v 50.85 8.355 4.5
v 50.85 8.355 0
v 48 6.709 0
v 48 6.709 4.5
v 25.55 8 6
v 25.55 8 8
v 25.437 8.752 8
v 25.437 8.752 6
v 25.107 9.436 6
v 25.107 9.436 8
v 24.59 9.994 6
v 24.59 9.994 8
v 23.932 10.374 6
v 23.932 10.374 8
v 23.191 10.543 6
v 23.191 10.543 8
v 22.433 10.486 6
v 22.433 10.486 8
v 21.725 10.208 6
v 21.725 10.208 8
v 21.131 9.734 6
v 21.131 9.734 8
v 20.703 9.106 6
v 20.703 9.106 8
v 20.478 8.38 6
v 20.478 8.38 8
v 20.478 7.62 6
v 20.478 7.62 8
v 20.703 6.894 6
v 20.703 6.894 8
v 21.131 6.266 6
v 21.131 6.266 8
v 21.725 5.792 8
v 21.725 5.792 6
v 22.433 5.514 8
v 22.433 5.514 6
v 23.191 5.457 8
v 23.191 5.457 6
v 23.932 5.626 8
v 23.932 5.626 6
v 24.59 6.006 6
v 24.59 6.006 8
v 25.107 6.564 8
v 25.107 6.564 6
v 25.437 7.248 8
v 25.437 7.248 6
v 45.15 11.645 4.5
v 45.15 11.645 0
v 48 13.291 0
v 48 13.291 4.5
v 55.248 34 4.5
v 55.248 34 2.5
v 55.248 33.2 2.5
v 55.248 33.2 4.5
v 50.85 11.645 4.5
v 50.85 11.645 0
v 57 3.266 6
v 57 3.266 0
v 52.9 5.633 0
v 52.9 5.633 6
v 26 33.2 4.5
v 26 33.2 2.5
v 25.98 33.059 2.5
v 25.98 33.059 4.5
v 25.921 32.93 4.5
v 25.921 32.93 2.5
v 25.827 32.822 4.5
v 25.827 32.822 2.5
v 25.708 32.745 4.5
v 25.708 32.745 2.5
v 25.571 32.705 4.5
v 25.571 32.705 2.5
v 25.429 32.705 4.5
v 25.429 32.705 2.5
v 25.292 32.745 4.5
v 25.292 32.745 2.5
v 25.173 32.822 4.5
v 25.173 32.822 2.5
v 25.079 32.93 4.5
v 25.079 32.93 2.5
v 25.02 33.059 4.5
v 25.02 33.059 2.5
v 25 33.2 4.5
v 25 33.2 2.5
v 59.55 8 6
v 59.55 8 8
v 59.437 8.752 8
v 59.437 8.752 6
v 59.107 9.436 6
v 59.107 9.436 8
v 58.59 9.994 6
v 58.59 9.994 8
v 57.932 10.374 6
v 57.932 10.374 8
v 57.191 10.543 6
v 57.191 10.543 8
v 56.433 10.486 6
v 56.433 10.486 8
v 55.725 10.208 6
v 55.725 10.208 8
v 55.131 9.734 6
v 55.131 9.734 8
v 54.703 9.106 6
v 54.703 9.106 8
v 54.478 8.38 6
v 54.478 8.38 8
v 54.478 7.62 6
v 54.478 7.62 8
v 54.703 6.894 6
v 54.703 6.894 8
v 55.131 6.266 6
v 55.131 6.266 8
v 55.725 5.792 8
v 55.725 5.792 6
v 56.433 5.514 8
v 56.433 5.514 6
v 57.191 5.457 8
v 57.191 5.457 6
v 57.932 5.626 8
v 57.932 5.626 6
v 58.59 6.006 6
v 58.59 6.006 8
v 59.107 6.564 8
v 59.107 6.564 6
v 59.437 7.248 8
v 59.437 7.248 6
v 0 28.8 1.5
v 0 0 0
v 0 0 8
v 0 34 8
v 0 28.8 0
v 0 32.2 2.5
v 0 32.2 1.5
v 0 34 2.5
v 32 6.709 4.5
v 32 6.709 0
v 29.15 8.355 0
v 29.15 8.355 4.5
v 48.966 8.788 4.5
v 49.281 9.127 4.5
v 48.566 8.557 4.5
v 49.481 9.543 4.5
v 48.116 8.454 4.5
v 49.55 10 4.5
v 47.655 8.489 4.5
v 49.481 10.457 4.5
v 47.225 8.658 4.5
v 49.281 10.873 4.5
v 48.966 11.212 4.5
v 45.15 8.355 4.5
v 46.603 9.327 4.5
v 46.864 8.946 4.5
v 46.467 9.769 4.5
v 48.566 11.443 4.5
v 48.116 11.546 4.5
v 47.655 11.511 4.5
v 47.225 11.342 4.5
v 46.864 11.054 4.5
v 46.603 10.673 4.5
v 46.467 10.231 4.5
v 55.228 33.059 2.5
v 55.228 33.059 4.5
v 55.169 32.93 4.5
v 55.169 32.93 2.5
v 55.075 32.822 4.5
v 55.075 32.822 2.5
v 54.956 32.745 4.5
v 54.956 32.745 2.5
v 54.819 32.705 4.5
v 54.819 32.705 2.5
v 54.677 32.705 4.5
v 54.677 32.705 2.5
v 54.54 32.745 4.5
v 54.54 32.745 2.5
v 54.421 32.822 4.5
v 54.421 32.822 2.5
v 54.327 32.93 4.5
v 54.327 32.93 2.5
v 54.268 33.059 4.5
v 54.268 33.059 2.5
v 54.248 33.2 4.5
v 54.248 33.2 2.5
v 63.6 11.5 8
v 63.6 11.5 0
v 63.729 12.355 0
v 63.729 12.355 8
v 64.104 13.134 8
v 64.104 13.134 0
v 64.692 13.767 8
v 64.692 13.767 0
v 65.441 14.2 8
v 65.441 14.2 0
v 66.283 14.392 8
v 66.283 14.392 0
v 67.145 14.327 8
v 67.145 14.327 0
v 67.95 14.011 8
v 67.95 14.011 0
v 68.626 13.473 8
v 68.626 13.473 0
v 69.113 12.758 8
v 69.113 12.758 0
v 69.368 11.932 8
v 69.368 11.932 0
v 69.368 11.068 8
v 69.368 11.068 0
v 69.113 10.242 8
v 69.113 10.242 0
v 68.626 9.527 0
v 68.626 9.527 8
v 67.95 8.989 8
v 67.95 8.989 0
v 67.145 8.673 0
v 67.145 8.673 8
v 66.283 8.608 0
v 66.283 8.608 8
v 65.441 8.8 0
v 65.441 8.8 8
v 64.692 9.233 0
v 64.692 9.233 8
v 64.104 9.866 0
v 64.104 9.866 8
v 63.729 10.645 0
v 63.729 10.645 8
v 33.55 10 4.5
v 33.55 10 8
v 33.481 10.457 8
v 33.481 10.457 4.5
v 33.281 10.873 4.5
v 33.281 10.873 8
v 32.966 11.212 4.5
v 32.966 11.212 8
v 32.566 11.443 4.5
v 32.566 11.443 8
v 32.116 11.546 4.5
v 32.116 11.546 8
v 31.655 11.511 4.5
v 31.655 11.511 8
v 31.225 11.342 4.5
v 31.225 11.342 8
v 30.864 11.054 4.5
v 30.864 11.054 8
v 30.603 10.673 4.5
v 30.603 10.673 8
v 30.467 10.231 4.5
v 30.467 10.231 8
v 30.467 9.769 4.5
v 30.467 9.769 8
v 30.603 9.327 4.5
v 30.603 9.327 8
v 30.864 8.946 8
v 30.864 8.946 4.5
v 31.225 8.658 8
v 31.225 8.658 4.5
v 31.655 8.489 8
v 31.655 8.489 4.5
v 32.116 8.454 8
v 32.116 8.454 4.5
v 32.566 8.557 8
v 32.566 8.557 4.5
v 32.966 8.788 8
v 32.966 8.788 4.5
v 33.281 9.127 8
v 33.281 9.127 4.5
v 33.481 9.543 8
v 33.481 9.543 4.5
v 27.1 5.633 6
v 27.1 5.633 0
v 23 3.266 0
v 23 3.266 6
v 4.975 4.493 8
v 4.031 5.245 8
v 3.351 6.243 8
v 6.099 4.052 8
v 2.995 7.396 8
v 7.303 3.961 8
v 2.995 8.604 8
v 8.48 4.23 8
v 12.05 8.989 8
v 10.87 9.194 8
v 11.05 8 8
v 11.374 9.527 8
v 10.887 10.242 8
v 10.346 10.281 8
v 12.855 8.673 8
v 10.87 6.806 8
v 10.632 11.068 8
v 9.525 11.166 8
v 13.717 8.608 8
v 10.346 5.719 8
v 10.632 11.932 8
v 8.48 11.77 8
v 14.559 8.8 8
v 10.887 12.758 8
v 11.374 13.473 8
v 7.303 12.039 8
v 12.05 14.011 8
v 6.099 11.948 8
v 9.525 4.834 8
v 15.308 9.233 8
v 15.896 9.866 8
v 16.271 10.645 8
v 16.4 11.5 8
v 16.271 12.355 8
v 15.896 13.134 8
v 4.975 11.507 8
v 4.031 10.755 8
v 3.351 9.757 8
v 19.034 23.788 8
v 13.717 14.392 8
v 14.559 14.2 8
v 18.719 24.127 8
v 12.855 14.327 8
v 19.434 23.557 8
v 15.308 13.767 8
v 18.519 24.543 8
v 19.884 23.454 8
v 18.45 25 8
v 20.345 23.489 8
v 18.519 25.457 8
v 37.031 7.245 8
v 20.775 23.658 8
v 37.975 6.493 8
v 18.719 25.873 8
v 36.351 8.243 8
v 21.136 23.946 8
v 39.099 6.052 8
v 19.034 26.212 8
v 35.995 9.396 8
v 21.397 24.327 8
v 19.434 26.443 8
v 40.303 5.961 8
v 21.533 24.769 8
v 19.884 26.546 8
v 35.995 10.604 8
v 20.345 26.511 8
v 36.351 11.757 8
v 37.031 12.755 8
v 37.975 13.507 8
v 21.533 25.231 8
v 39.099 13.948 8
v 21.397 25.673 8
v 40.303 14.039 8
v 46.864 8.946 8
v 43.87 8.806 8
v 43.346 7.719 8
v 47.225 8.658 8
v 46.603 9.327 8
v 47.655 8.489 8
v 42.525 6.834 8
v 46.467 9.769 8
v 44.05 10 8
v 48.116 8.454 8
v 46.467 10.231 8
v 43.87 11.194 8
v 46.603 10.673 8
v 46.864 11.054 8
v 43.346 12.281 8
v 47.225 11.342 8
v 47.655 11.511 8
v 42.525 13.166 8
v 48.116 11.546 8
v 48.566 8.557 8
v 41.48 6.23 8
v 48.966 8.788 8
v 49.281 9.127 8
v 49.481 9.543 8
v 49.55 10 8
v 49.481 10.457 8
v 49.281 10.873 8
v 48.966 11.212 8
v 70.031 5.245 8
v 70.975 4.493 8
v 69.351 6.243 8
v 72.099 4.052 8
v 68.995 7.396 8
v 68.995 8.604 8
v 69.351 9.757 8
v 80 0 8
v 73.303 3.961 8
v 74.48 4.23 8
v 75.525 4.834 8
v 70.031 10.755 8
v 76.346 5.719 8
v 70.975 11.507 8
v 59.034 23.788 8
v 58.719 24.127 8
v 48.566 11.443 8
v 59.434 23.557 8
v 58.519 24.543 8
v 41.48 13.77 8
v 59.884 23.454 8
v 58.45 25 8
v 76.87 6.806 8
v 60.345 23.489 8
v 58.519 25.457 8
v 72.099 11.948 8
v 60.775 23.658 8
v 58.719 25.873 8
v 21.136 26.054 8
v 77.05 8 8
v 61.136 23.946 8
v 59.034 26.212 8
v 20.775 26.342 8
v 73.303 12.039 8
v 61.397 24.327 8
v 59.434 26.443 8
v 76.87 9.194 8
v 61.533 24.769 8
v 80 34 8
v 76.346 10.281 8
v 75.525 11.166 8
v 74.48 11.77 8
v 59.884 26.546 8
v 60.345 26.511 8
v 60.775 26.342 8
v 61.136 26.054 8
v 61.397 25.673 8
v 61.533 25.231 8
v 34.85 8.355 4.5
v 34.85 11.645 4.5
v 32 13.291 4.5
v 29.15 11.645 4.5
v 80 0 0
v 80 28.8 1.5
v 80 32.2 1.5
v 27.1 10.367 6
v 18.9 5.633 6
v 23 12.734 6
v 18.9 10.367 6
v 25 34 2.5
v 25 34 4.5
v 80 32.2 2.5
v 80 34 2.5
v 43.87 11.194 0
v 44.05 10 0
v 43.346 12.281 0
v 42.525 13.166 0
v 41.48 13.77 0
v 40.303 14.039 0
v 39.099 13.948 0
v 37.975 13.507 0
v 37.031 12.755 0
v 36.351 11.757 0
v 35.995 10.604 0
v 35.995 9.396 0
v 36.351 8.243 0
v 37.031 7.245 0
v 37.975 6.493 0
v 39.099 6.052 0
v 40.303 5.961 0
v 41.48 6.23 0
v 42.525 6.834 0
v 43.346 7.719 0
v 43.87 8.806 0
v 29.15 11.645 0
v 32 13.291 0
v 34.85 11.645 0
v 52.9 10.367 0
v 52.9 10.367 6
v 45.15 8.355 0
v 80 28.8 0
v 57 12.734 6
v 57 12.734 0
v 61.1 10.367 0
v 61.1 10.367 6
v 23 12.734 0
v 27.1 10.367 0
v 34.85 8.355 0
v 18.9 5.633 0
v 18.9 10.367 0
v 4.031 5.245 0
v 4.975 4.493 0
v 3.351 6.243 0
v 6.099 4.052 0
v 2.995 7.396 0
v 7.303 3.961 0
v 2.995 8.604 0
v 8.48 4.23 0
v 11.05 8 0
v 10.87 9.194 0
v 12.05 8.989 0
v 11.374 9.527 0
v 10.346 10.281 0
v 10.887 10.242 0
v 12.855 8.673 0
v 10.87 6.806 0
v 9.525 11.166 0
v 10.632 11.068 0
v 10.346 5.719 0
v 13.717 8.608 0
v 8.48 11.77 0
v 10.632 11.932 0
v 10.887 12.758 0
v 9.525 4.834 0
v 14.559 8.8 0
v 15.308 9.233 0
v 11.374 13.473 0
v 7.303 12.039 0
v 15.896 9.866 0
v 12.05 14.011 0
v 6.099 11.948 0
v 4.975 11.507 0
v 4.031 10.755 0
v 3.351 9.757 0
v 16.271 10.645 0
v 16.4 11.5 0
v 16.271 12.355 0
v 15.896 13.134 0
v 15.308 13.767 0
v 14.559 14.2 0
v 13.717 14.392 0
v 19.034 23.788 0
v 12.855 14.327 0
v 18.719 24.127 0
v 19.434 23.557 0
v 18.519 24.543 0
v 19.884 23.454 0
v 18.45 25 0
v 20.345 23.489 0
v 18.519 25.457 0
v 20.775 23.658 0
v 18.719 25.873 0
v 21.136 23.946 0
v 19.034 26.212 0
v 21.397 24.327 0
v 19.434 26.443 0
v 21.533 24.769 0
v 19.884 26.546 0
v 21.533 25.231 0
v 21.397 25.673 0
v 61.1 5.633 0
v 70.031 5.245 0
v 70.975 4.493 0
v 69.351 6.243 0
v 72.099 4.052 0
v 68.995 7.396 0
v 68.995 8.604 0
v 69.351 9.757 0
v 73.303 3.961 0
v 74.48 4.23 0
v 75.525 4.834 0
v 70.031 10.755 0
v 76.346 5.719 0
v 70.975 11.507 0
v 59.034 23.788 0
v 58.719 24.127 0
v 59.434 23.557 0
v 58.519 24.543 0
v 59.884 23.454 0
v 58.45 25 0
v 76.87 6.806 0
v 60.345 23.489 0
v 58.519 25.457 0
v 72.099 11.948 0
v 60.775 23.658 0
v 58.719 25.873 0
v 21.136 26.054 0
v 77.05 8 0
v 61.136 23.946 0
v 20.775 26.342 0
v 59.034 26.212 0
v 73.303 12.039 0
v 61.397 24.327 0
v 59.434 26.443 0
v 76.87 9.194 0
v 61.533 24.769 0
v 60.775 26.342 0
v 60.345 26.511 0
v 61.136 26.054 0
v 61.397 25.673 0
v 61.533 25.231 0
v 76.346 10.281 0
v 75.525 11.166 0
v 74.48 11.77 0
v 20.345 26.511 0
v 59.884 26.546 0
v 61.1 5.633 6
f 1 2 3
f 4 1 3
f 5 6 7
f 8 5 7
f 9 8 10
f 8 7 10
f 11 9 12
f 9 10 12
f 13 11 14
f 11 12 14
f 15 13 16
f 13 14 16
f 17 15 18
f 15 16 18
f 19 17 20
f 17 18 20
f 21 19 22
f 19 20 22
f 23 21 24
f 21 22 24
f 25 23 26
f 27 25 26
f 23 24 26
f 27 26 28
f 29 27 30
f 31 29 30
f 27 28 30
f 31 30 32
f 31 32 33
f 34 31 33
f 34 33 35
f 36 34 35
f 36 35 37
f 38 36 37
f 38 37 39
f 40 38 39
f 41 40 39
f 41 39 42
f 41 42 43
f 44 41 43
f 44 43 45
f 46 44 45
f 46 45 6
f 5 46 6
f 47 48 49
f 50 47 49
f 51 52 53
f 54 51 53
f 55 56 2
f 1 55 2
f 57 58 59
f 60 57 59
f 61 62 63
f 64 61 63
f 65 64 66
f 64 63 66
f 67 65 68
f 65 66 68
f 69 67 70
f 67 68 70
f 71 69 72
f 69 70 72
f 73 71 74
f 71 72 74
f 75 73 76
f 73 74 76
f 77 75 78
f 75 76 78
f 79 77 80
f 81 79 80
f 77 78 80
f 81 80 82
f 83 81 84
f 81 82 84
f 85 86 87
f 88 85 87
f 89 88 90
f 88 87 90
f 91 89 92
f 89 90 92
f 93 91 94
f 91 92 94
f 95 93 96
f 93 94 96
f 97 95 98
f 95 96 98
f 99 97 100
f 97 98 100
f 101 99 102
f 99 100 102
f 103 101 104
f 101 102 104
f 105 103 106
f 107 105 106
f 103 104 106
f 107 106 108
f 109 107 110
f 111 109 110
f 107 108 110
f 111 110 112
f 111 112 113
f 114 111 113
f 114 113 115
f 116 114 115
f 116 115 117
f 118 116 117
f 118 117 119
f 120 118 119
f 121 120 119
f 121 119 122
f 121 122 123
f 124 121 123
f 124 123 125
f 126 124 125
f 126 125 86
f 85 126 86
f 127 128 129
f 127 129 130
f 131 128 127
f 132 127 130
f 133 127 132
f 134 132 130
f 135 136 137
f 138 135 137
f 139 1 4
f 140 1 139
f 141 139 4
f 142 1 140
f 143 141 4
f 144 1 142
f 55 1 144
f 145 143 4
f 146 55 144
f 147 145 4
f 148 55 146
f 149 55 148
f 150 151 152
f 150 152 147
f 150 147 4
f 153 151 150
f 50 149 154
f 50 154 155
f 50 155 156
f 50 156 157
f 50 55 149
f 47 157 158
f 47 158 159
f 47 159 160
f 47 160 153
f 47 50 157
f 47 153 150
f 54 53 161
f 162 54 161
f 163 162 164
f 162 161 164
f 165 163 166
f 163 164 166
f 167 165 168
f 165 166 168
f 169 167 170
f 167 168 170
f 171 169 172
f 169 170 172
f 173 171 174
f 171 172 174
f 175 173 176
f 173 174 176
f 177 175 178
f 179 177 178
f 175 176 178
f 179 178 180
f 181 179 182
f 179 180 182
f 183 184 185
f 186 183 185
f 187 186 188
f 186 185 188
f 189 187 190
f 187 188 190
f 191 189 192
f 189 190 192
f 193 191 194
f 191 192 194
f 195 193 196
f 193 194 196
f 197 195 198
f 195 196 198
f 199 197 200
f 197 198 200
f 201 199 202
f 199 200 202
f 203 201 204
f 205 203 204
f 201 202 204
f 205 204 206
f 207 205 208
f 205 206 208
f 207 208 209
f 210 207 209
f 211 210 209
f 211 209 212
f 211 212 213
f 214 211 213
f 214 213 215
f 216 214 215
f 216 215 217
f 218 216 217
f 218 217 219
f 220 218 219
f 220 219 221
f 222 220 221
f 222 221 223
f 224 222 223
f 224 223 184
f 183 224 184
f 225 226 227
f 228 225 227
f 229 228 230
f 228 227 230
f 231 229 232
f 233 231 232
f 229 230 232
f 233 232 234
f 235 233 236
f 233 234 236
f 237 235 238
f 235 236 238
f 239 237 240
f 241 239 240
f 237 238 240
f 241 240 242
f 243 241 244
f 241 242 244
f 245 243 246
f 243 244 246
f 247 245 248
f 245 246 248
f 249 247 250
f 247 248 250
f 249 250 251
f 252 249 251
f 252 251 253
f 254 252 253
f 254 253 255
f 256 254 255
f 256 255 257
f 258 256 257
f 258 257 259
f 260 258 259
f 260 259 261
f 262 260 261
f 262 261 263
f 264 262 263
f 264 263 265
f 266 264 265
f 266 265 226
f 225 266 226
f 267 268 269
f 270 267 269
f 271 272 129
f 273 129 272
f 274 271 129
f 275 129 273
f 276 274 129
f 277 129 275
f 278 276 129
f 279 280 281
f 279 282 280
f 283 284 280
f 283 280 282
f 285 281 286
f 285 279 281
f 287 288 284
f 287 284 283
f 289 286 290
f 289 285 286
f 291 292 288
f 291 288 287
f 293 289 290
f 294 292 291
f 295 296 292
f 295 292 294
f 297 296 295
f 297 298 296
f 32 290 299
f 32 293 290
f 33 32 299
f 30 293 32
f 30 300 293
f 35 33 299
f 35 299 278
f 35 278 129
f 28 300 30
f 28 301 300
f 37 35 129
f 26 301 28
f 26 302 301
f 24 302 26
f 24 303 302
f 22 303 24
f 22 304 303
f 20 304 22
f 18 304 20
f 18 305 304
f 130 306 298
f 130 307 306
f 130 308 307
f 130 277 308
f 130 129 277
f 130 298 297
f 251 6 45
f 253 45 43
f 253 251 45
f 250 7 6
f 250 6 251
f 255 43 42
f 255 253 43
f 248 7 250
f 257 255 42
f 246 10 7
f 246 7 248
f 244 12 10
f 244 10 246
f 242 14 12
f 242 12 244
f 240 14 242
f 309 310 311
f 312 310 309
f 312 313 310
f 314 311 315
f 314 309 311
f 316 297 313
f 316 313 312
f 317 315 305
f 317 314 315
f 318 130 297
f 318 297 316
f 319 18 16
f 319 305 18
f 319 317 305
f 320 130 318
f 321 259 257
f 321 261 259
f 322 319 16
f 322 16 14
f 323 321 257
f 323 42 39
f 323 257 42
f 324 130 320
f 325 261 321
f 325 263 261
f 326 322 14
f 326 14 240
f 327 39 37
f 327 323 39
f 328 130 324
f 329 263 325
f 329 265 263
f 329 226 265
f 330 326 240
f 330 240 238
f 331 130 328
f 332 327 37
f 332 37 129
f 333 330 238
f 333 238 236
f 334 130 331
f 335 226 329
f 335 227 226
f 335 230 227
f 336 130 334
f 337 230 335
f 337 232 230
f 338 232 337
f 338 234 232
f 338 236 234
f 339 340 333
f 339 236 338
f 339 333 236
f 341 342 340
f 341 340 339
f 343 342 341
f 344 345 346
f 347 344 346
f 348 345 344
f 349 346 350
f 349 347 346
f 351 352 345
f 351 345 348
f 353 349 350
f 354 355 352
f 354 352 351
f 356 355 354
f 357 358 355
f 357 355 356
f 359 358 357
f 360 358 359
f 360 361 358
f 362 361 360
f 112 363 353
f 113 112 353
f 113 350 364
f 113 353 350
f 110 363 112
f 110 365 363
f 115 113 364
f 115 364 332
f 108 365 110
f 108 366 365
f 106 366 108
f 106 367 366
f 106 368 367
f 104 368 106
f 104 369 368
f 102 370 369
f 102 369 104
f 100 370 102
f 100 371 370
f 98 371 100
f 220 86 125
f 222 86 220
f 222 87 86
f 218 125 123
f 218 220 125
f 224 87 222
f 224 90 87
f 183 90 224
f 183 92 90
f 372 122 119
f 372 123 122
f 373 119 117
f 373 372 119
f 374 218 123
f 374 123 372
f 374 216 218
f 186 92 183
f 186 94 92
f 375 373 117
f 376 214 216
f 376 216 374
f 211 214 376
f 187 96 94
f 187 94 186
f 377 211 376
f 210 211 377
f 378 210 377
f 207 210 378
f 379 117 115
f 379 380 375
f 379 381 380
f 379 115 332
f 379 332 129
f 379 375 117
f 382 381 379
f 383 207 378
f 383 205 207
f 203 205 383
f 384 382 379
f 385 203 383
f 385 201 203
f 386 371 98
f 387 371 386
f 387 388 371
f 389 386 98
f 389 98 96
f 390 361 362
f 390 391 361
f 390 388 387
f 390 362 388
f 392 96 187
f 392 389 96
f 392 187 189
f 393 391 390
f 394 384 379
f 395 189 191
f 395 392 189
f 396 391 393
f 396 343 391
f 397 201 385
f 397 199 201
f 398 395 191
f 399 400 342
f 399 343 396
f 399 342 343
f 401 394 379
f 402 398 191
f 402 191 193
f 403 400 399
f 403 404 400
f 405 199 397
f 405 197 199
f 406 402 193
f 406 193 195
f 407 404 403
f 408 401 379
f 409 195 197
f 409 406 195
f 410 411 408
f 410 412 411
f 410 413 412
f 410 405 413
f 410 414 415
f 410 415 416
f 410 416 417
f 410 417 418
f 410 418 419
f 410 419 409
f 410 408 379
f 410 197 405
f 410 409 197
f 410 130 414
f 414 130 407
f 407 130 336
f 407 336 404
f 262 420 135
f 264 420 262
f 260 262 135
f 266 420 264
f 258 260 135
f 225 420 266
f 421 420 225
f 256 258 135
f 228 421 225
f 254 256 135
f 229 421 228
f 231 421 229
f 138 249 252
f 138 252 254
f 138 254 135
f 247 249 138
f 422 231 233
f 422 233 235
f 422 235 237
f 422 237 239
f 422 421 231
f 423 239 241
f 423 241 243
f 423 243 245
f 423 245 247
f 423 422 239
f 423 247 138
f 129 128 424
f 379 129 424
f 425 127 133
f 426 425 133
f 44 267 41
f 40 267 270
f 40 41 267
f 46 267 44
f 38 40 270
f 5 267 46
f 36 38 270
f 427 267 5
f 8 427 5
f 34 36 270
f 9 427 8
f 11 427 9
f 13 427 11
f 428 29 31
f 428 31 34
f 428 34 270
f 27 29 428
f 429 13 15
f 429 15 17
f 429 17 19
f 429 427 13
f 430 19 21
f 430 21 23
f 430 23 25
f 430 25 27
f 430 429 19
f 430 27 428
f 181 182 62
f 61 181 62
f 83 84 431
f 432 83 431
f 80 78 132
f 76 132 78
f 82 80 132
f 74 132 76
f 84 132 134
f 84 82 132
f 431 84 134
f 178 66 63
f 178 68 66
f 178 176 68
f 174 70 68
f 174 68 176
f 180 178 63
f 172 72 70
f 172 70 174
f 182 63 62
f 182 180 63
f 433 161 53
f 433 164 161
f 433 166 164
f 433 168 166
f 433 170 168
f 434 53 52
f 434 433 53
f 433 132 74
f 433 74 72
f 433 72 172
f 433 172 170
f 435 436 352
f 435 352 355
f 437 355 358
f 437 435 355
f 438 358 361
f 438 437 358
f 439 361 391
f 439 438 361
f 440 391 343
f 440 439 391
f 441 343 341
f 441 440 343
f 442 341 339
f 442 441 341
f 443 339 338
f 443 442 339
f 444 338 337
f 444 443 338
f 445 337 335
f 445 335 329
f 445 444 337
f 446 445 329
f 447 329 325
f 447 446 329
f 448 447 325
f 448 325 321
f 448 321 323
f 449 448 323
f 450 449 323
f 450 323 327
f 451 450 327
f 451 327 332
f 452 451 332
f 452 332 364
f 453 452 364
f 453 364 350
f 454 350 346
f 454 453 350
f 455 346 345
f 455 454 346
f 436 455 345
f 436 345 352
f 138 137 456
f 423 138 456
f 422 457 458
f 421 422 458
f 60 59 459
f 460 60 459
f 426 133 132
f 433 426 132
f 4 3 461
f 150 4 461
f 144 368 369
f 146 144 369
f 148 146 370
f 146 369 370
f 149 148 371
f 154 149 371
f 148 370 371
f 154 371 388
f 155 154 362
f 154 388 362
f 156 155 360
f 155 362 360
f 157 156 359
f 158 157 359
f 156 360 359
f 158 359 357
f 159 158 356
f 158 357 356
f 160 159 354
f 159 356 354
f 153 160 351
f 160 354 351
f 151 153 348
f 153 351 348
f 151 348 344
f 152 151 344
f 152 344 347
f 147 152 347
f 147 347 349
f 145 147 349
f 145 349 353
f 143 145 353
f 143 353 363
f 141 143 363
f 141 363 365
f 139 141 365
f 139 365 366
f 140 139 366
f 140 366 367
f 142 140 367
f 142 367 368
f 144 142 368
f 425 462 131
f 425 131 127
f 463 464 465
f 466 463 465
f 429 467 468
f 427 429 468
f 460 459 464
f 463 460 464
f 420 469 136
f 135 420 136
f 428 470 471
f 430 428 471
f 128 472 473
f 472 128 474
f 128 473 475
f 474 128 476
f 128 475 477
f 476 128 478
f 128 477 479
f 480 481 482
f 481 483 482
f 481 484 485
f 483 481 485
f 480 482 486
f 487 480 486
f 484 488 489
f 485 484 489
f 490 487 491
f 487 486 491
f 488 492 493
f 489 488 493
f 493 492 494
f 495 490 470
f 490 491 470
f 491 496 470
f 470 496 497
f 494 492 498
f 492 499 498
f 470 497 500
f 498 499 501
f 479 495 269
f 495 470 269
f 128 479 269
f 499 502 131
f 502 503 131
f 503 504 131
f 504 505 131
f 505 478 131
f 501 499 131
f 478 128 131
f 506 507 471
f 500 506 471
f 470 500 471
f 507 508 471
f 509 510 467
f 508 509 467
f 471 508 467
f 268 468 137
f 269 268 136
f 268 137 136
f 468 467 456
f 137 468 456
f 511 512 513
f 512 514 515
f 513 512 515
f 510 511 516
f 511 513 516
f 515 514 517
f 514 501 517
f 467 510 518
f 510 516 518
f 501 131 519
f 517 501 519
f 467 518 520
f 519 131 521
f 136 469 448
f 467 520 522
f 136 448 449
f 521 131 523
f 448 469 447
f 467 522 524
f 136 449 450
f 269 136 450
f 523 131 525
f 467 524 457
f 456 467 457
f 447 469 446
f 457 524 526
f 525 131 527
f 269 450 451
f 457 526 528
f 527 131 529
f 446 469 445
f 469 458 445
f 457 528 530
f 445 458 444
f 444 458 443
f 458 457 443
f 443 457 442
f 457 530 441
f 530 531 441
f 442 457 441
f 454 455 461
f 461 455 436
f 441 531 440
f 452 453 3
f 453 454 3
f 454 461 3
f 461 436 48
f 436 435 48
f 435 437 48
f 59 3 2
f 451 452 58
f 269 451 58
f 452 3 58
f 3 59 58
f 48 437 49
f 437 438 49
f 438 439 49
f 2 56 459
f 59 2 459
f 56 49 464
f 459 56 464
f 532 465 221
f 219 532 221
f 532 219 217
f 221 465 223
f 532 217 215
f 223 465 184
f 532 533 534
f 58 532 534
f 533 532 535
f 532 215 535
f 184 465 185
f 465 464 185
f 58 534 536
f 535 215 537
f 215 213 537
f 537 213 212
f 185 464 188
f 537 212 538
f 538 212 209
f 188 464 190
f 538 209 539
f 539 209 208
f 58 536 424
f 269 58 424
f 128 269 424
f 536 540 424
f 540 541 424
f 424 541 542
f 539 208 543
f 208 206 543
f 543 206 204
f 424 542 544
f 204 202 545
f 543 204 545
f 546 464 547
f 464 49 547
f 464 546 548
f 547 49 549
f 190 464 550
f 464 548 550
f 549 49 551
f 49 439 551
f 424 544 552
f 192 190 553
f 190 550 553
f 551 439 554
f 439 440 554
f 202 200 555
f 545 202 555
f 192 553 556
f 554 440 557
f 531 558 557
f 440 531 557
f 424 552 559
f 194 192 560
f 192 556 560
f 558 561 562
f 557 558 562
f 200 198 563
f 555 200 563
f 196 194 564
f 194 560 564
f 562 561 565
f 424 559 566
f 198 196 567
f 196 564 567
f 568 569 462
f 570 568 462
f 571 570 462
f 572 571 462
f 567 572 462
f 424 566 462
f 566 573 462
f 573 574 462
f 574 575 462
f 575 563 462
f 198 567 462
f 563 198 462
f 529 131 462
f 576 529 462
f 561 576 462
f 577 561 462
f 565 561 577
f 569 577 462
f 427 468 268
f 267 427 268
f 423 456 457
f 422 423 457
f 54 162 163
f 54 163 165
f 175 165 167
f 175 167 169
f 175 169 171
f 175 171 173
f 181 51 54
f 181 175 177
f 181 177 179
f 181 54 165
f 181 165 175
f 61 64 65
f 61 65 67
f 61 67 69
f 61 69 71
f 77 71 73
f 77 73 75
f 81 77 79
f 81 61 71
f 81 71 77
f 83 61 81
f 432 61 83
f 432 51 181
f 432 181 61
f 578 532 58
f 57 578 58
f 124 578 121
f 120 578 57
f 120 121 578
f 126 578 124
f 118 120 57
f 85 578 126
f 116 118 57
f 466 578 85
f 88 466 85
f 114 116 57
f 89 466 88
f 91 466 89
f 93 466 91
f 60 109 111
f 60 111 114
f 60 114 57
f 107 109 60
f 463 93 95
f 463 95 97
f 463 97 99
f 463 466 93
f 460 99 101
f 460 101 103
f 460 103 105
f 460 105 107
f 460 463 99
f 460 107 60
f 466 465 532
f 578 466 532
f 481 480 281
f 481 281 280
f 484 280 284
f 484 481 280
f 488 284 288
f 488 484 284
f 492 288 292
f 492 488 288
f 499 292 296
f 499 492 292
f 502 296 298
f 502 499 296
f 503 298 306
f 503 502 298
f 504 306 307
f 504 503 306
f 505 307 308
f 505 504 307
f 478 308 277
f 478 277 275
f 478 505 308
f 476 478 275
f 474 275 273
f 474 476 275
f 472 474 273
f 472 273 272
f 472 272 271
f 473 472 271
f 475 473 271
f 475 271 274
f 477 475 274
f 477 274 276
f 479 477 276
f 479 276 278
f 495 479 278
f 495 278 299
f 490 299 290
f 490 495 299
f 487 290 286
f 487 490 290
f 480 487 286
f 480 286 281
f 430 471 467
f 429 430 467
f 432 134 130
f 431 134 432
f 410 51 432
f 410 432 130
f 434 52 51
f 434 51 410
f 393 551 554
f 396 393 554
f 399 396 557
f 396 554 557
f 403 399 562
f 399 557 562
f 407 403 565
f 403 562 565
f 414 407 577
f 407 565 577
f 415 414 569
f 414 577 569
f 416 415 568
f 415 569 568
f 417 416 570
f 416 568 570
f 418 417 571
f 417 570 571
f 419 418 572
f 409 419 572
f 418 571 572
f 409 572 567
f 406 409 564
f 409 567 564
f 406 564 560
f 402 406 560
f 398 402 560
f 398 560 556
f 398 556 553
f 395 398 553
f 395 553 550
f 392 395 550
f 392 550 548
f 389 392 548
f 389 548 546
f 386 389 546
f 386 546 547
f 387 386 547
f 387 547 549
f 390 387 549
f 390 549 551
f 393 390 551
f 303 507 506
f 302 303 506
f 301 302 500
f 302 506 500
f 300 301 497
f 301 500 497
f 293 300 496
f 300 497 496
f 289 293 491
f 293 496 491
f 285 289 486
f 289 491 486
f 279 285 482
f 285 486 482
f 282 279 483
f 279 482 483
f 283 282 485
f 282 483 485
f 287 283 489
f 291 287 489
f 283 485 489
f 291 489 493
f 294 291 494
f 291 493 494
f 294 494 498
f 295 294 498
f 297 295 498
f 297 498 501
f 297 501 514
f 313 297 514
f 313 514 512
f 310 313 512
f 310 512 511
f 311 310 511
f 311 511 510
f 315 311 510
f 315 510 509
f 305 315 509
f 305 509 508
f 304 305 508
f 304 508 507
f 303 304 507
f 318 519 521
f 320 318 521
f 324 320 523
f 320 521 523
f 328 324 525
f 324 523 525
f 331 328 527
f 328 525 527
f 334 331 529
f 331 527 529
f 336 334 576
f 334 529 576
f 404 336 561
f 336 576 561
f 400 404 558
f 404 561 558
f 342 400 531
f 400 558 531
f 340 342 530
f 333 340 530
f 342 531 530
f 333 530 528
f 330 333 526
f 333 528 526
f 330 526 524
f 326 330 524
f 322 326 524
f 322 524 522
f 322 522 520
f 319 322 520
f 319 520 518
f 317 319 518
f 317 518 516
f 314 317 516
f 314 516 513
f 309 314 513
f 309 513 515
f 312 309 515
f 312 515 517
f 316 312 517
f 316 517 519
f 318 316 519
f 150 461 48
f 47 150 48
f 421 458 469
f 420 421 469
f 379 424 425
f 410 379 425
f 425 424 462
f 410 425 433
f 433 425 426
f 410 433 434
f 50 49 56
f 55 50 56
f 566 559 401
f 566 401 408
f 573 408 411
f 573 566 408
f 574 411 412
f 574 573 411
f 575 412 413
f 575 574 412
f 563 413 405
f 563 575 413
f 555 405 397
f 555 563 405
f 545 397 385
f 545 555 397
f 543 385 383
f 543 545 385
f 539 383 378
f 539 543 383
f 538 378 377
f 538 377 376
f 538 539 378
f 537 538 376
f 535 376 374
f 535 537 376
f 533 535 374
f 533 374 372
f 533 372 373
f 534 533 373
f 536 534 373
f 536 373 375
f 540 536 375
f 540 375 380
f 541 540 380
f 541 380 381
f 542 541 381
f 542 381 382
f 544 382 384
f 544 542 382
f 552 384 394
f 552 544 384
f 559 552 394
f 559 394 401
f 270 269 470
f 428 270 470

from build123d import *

# Parameters (mm, degrees)
SKETCH_2_W           = 80
SKETCH_2_H           = 34
SKETCH_2_R           = 4.05
EXTRUDE_1_DEPTH      = 8
SKETCH_3_R           = 2.55
CUT_EXTRUDE_1_DEPTH  = 88.292611371
CUT_EXTRUDE_2_DEPTH  = 88.292611371
SKETCH_5_R           = 1.55
CUT_EXTRUDE_3_DEPTH  = 88.292611371
CUT_EXTRUDE_15_DEPTH = 4.5
SKETCH_11_R          = 1.55
CUT_EXTRUDE_7_DEPTH  = 88.292611371
CUT_EXTRUDE_11_DEPTH = 2
SKETCH_21_R          = 2.9
CUT_EXTRUDE_13_DEPTH = 88.292611371
CUT_EXTRUDE_14_DEPTH = 6


with BuildPart() as part:
    # 草图2 → 凸台-拉伸1 (new body)
    with BuildSketch(Plane.XY):
        with Locations((40, 17)):
            Rectangle(SKETCH_2_W, SKETCH_2_H)
        with Locations((7, 8)):
            Circle(SKETCH_2_R, mode=Mode.SUBTRACT)
        with Locations((40, 10)):
            Circle(SKETCH_2_R, mode=Mode.SUBTRACT)
        with Locations((73, 8)):
            Circle(SKETCH_2_R, mode=Mode.SUBTRACT)
    extrude(amount=EXTRUDE_1_DEPTH)

    # 草图3 → 切除-拉伸1 (cut, through all)
    with BuildSketch(Plane.XY.offset(8)):
        with Locations((23, 8)):
            Circle(SKETCH_3_R)
        with Locations((57, 8)):
            Circle(SKETCH_3_R)
    extrude(amount=-CUT_EXTRUDE_1_DEPTH, mode=Mode.SUBTRACT)

    # 草图4 → 切除-拉伸2 (cut, through all)
    with BuildSketch(Plane(origin=(80, 0, 0), x_dir=(0, 0, -1), z_dir=(1, 0, 0))):
        Polygon((-1.5, 32.2), (-2.5, 32.2), (-2.5, 34), (0, 34), (0, 28.8), (-1.5, 28.8), align=None)
    extrude(amount=-CUT_EXTRUDE_2_DEPTH, mode=Mode.SUBTRACT)

    # 草图5 → 切除-拉伸3 (cut, through all)
    with BuildSketch(Plane.XY.offset(8)):
        with Locations((48, 10)):
            Circle(SKETCH_5_R)
        with Locations((32, 10)):
            Circle(SKETCH_5_R)
    extrude(amount=-CUT_EXTRUDE_3_DEPTH, mode=Mode.SUBTRACT)

    # 草图8 → 切除-拉伸15 (cut)
    with BuildSketch(Plane(origin=(0, 0, 0), x_dir=(-1, 0, 0), z_dir=(0, 0, -1))):
        Polygon((-48, 6.709103466), (-45.15, 8.354551733), (-45.15, 11.645448267), (-48, 13.290896534), (-50.85, 11.645448267), (-50.85, 8.354551733), align=None)
        Polygon((-34.85, 11.645448267), (-34.85, 8.354551733), (-32, 6.709103466), (-29.15, 8.354551733), (-29.15, 11.645448267), (-32, 13.290896534), align=None)
    extrude(amount=-CUT_EXTRUDE_15_DEPTH, mode=Mode.SUBTRACT)

    # 草图11 → 切除-拉伸7 (cut, through all)
    with BuildSketch(Plane(origin=(0, 0, 0), x_dir=(-1, 0, 0), z_dir=(0, 0, -1))):
        with Locations((-60, 25)):
            Circle(SKETCH_11_R)
        with Locations((-20, 25)):
            Circle(SKETCH_11_R)
    extrude(amount=-CUT_EXTRUDE_7_DEPTH, mode=Mode.SUBTRACT)

    # 草图19 → 切除-拉伸11 (cut)
    with BuildSketch(Plane(origin=(0, 0, 2.5), x_dir=(-1, 0, 0), z_dir=(0, 0, -1))):
        with BuildLine():
            Line((-25, 34), (-55.247938178, 34))
            Line((-55.247938178, 34), (-55.247938178, 33.2))
            ThreePointArc((-55.247938178, 33.2), (-54.747938178, 32.7), (-54.247938178, 33.2))
            Line((-54.247938178, 33.2), (-26, 33.2))
            ThreePointArc((-26, 33.2), (-25.5, 32.7), (-25, 33.2))
            Line((-25, 33.2), (-25, 34))
        make_face()
    extrude(amount=-CUT_EXTRUDE_11_DEPTH, mode=Mode.SUBTRACT)

    # 草图21 → 切除-拉伸13 (cut, through all)
    with BuildSketch(Plane(origin=(0, 0, 0), x_dir=(-1, 0, 0), z_dir=(0, 0, -1))):
        with Locations((-66.5, 11.5)):
            Circle(SKETCH_21_R)
        with Locations(Location((-13.5, 11.5, 0), (0, 0, 180))):
            Circle(SKETCH_21_R)
    extrude(amount=-CUT_EXTRUDE_13_DEPTH, mode=Mode.SUBTRACT)

    # 草图22 → 切除-拉伸14 (cut)
    with BuildSketch(Plane(origin=(0, 0, 0), x_dir=(-1, 0, 0), z_dir=(0, 0, -1))):
        Polygon((-52.9, 5.632863896), (-52.9, 10.367136104), (-57, 12.734272207), (-61.1, 10.367136104), (-61.1, 5.632863896), (-57, 3.265727793), align=None)
        Polygon((-23, 3.265727793), (-18.9, 5.632863896), (-18.9, 10.367136104), (-23, 12.734272207), (-27.1, 10.367136104), (-27.1, 5.632863896), align=None)
    extrude(amount=-CUT_EXTRUDE_14_DEPTH, mode=Mode.SUBTRACT)


solid = part.part
